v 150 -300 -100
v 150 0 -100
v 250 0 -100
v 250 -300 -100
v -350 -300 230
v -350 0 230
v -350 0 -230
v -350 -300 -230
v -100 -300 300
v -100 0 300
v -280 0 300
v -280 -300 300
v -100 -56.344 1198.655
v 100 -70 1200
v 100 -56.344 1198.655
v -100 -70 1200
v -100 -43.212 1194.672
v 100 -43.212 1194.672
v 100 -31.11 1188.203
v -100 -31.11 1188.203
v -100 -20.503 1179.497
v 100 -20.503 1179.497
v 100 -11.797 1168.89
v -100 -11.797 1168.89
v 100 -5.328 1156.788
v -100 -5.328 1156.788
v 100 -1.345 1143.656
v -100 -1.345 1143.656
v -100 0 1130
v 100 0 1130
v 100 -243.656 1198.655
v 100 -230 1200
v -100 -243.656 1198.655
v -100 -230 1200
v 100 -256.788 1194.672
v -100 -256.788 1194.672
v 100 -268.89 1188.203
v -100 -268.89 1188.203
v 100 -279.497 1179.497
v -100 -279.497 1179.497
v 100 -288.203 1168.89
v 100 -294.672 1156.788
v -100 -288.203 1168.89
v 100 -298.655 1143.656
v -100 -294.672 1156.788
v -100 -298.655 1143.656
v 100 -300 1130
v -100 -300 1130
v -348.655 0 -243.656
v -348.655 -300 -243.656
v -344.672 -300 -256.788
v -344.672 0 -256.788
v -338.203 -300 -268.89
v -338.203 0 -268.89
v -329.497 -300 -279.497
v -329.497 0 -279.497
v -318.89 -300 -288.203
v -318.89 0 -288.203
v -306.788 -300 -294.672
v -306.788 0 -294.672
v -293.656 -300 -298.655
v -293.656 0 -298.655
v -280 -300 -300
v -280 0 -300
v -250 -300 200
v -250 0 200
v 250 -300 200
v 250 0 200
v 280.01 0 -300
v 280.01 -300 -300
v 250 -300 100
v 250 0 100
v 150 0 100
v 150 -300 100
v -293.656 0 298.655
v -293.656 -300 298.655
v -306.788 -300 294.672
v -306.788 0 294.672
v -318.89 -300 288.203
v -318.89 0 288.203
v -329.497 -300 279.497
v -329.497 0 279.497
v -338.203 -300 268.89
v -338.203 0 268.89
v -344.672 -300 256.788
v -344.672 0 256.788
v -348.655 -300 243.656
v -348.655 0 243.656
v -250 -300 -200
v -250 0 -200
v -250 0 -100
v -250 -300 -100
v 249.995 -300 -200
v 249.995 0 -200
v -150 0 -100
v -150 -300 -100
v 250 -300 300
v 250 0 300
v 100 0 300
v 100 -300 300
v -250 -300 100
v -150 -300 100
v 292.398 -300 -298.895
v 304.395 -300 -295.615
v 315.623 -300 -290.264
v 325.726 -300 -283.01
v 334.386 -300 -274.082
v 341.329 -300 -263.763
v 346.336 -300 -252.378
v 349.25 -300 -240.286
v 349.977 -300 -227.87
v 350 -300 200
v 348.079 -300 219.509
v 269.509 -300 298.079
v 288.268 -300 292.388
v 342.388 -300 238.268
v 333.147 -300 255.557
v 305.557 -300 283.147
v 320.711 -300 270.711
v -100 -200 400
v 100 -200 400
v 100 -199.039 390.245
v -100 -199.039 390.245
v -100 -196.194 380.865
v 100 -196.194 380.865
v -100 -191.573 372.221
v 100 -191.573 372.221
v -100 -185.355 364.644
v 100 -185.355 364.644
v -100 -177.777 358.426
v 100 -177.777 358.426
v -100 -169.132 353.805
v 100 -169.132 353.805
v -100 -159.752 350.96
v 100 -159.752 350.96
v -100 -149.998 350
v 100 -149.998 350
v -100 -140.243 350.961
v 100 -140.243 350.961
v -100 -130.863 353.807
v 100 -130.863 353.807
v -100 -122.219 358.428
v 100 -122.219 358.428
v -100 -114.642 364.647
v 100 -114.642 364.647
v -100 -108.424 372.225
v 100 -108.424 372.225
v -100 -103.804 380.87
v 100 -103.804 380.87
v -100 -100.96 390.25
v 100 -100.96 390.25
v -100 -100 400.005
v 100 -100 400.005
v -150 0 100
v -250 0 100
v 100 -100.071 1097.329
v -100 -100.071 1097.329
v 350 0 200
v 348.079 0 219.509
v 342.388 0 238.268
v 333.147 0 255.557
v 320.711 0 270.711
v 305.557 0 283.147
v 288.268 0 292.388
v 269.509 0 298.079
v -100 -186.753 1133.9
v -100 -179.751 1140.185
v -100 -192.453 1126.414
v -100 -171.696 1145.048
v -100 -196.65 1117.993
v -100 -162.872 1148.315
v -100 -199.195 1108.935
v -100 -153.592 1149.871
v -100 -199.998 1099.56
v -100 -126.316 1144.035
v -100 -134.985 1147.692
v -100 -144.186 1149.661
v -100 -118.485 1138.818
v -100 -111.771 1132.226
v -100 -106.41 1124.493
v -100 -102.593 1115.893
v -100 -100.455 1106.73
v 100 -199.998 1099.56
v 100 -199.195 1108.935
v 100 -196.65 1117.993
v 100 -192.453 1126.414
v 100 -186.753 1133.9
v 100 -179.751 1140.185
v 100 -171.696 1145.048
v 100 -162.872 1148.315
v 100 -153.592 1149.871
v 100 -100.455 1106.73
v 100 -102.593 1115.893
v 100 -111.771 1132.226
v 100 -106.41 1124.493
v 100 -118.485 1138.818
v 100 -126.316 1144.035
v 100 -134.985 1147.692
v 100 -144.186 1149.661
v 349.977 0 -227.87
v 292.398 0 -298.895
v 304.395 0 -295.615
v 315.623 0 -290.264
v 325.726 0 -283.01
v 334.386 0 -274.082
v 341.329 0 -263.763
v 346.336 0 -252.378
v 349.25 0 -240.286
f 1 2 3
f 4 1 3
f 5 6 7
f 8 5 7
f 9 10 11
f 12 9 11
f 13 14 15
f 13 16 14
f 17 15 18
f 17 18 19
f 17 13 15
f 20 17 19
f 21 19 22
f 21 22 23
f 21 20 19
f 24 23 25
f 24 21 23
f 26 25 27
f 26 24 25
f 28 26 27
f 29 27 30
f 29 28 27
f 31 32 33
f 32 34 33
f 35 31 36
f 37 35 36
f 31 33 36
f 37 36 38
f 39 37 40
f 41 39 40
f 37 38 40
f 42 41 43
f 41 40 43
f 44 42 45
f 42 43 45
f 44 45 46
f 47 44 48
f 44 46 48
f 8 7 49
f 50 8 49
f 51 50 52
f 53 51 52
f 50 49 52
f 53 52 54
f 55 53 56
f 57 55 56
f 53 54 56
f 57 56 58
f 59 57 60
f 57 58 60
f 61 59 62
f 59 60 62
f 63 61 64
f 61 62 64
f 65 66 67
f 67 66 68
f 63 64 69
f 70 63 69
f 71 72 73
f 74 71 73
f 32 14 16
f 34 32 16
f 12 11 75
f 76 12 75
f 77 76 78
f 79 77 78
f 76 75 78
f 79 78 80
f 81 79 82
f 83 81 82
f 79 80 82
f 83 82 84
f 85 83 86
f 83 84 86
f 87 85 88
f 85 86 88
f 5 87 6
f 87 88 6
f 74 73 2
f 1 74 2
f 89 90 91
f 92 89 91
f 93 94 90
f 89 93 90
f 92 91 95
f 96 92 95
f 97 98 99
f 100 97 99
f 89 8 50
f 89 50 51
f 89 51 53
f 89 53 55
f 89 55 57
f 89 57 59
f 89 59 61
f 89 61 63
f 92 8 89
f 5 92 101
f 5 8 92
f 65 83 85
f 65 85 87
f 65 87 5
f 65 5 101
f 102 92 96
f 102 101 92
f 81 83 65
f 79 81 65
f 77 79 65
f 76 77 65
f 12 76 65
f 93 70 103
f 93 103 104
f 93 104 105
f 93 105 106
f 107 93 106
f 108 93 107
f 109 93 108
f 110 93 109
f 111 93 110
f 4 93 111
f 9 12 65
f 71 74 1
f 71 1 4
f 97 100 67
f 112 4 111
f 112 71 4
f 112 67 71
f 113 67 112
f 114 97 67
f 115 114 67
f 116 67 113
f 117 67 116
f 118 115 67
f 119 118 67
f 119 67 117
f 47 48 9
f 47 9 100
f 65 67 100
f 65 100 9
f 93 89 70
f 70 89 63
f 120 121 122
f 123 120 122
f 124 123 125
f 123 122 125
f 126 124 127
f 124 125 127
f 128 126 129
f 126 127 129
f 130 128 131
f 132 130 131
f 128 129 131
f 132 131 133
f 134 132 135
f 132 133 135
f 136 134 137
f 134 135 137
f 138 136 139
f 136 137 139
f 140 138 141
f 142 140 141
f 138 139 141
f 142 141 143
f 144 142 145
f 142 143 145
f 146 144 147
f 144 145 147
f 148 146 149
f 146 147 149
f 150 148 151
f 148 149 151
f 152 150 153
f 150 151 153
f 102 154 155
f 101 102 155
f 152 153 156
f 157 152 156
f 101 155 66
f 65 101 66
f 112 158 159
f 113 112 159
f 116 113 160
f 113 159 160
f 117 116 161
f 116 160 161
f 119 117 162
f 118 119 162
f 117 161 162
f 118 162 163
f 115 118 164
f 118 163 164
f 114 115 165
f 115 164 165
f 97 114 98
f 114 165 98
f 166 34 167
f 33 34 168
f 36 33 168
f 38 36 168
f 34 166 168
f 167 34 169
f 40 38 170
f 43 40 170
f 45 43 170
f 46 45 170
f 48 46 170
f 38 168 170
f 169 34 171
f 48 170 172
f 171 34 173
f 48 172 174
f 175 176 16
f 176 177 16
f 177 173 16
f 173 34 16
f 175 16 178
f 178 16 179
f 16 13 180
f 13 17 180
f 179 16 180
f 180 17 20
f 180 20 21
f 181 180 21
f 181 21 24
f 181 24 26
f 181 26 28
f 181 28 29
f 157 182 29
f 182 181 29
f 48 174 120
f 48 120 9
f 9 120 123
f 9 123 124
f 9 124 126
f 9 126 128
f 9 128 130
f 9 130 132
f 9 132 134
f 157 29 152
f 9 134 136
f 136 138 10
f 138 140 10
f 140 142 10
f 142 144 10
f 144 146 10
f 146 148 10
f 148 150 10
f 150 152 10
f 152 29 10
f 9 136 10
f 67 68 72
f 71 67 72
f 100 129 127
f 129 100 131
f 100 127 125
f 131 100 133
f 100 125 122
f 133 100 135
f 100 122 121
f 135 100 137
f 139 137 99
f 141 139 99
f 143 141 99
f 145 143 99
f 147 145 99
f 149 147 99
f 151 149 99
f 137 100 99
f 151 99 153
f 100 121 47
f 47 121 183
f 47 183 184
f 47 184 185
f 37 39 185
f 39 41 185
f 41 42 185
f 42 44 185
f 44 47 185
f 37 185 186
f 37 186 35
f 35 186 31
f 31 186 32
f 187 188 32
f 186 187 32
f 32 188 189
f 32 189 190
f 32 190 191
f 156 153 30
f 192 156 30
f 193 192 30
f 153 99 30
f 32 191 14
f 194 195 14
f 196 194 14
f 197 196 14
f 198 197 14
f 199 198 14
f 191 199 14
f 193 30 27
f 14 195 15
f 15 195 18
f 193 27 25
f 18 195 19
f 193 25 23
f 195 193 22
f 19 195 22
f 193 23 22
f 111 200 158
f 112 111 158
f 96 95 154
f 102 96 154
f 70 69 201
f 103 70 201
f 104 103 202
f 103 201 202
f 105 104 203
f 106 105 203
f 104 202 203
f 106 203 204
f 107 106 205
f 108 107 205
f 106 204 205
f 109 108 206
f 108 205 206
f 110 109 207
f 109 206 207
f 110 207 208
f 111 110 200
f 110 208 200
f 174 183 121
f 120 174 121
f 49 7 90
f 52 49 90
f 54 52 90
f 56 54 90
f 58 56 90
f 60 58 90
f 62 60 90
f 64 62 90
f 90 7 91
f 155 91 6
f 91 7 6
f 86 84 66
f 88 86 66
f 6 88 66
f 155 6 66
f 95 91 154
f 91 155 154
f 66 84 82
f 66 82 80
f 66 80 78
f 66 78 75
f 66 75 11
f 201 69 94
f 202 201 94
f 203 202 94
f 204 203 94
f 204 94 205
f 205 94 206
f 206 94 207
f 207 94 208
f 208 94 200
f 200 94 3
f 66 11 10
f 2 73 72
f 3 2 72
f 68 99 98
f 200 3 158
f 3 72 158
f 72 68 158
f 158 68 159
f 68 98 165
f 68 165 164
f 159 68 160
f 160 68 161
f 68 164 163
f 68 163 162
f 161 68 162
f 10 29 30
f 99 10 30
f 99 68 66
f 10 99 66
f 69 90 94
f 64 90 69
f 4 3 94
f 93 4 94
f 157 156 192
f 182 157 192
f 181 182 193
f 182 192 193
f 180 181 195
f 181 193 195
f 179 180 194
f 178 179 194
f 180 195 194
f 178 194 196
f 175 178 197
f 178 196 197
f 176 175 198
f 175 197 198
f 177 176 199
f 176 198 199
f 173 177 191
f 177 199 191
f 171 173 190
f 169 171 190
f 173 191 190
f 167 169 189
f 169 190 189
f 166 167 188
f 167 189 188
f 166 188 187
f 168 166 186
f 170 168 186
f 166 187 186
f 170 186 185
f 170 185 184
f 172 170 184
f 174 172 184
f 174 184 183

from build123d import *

# Parameters (mm, degrees)
F1_DEPTH = 300
F2_R     = 70
F4_DEPTH = 1454


with BuildPart() as f1:
    # F0 (on Front) → F1 (new body)
    with BuildSketch(Plane.XZ):
        with BuildLine():
            Line((-280, -300), (280.009727, -300))
            ThreePointArc((280.009727, -300), (330.254635, -278.73858), (349.977312, -227.869977))
            Line((349.977312, -227.869977), (350, 200))
            ThreePointArc((350, 200), (320.710678, 270.710678), (250, 300))
            Line((250, 300), (100, 300))
            Line((100, 300), (100, 1200))
            Line((100, 1200), (-100, 1200))
            Line((-100, 1200), (-100, 300))
            Line((-100, 300), (-280, 300))
            ThreePointArc((-280, 300), (-329.497475, 279.497475), (-350, 230))
            Line((-350, 230), (-350, -230))
            ThreePointArc((-350, -230), (-329.497475, -279.497475), (-280, -300))
        make_face()
        Polygon((-250, 100), (-250, 200), (250, 200), (250, 100), (150, 100), (150, -100), (250, -100), (249.994698, -200), (-250, -200), (-250, -100), (-150, -100), (-150, 100), align=None, mode=Mode.SUBTRACT)
    extrude(amount=F1_DEPTH)

    # F2
    f2_edges = [f1.edges().sort_by_distance(p)[0] for p in [
        (0, 0, 1200),
        (0, -300, 1200),
    ]]
    fillet(f2_edges, radius=F2_R)


with BuildPart() as f4:
    # F3 (on face) → F4 (new body)
    with BuildSketch(Plane.YZ.offset(100)):
        with BuildLine():
            Line((-100, 400.005119), (-100.071387, 1097.329122))
            ThreePointArc((-100.071387, 1097.329122), (-148.884053, 1149.987545), (-199.998063, 1099.559935))
            Line((-199.998063, 1099.559935), (-200, 400.000138))
            ThreePointArc((-200, 400.000138), (-149.99751, 350), (-100, 400.005119))
        make_face()
    extrude(amount=-F4_DEPTH)


with BuildPart() as f1_1:
    add(f1.part)

    # F5: cut F4
    add(f4.part, mode=Mode.SUBTRACT)


solid = f1_1.part
